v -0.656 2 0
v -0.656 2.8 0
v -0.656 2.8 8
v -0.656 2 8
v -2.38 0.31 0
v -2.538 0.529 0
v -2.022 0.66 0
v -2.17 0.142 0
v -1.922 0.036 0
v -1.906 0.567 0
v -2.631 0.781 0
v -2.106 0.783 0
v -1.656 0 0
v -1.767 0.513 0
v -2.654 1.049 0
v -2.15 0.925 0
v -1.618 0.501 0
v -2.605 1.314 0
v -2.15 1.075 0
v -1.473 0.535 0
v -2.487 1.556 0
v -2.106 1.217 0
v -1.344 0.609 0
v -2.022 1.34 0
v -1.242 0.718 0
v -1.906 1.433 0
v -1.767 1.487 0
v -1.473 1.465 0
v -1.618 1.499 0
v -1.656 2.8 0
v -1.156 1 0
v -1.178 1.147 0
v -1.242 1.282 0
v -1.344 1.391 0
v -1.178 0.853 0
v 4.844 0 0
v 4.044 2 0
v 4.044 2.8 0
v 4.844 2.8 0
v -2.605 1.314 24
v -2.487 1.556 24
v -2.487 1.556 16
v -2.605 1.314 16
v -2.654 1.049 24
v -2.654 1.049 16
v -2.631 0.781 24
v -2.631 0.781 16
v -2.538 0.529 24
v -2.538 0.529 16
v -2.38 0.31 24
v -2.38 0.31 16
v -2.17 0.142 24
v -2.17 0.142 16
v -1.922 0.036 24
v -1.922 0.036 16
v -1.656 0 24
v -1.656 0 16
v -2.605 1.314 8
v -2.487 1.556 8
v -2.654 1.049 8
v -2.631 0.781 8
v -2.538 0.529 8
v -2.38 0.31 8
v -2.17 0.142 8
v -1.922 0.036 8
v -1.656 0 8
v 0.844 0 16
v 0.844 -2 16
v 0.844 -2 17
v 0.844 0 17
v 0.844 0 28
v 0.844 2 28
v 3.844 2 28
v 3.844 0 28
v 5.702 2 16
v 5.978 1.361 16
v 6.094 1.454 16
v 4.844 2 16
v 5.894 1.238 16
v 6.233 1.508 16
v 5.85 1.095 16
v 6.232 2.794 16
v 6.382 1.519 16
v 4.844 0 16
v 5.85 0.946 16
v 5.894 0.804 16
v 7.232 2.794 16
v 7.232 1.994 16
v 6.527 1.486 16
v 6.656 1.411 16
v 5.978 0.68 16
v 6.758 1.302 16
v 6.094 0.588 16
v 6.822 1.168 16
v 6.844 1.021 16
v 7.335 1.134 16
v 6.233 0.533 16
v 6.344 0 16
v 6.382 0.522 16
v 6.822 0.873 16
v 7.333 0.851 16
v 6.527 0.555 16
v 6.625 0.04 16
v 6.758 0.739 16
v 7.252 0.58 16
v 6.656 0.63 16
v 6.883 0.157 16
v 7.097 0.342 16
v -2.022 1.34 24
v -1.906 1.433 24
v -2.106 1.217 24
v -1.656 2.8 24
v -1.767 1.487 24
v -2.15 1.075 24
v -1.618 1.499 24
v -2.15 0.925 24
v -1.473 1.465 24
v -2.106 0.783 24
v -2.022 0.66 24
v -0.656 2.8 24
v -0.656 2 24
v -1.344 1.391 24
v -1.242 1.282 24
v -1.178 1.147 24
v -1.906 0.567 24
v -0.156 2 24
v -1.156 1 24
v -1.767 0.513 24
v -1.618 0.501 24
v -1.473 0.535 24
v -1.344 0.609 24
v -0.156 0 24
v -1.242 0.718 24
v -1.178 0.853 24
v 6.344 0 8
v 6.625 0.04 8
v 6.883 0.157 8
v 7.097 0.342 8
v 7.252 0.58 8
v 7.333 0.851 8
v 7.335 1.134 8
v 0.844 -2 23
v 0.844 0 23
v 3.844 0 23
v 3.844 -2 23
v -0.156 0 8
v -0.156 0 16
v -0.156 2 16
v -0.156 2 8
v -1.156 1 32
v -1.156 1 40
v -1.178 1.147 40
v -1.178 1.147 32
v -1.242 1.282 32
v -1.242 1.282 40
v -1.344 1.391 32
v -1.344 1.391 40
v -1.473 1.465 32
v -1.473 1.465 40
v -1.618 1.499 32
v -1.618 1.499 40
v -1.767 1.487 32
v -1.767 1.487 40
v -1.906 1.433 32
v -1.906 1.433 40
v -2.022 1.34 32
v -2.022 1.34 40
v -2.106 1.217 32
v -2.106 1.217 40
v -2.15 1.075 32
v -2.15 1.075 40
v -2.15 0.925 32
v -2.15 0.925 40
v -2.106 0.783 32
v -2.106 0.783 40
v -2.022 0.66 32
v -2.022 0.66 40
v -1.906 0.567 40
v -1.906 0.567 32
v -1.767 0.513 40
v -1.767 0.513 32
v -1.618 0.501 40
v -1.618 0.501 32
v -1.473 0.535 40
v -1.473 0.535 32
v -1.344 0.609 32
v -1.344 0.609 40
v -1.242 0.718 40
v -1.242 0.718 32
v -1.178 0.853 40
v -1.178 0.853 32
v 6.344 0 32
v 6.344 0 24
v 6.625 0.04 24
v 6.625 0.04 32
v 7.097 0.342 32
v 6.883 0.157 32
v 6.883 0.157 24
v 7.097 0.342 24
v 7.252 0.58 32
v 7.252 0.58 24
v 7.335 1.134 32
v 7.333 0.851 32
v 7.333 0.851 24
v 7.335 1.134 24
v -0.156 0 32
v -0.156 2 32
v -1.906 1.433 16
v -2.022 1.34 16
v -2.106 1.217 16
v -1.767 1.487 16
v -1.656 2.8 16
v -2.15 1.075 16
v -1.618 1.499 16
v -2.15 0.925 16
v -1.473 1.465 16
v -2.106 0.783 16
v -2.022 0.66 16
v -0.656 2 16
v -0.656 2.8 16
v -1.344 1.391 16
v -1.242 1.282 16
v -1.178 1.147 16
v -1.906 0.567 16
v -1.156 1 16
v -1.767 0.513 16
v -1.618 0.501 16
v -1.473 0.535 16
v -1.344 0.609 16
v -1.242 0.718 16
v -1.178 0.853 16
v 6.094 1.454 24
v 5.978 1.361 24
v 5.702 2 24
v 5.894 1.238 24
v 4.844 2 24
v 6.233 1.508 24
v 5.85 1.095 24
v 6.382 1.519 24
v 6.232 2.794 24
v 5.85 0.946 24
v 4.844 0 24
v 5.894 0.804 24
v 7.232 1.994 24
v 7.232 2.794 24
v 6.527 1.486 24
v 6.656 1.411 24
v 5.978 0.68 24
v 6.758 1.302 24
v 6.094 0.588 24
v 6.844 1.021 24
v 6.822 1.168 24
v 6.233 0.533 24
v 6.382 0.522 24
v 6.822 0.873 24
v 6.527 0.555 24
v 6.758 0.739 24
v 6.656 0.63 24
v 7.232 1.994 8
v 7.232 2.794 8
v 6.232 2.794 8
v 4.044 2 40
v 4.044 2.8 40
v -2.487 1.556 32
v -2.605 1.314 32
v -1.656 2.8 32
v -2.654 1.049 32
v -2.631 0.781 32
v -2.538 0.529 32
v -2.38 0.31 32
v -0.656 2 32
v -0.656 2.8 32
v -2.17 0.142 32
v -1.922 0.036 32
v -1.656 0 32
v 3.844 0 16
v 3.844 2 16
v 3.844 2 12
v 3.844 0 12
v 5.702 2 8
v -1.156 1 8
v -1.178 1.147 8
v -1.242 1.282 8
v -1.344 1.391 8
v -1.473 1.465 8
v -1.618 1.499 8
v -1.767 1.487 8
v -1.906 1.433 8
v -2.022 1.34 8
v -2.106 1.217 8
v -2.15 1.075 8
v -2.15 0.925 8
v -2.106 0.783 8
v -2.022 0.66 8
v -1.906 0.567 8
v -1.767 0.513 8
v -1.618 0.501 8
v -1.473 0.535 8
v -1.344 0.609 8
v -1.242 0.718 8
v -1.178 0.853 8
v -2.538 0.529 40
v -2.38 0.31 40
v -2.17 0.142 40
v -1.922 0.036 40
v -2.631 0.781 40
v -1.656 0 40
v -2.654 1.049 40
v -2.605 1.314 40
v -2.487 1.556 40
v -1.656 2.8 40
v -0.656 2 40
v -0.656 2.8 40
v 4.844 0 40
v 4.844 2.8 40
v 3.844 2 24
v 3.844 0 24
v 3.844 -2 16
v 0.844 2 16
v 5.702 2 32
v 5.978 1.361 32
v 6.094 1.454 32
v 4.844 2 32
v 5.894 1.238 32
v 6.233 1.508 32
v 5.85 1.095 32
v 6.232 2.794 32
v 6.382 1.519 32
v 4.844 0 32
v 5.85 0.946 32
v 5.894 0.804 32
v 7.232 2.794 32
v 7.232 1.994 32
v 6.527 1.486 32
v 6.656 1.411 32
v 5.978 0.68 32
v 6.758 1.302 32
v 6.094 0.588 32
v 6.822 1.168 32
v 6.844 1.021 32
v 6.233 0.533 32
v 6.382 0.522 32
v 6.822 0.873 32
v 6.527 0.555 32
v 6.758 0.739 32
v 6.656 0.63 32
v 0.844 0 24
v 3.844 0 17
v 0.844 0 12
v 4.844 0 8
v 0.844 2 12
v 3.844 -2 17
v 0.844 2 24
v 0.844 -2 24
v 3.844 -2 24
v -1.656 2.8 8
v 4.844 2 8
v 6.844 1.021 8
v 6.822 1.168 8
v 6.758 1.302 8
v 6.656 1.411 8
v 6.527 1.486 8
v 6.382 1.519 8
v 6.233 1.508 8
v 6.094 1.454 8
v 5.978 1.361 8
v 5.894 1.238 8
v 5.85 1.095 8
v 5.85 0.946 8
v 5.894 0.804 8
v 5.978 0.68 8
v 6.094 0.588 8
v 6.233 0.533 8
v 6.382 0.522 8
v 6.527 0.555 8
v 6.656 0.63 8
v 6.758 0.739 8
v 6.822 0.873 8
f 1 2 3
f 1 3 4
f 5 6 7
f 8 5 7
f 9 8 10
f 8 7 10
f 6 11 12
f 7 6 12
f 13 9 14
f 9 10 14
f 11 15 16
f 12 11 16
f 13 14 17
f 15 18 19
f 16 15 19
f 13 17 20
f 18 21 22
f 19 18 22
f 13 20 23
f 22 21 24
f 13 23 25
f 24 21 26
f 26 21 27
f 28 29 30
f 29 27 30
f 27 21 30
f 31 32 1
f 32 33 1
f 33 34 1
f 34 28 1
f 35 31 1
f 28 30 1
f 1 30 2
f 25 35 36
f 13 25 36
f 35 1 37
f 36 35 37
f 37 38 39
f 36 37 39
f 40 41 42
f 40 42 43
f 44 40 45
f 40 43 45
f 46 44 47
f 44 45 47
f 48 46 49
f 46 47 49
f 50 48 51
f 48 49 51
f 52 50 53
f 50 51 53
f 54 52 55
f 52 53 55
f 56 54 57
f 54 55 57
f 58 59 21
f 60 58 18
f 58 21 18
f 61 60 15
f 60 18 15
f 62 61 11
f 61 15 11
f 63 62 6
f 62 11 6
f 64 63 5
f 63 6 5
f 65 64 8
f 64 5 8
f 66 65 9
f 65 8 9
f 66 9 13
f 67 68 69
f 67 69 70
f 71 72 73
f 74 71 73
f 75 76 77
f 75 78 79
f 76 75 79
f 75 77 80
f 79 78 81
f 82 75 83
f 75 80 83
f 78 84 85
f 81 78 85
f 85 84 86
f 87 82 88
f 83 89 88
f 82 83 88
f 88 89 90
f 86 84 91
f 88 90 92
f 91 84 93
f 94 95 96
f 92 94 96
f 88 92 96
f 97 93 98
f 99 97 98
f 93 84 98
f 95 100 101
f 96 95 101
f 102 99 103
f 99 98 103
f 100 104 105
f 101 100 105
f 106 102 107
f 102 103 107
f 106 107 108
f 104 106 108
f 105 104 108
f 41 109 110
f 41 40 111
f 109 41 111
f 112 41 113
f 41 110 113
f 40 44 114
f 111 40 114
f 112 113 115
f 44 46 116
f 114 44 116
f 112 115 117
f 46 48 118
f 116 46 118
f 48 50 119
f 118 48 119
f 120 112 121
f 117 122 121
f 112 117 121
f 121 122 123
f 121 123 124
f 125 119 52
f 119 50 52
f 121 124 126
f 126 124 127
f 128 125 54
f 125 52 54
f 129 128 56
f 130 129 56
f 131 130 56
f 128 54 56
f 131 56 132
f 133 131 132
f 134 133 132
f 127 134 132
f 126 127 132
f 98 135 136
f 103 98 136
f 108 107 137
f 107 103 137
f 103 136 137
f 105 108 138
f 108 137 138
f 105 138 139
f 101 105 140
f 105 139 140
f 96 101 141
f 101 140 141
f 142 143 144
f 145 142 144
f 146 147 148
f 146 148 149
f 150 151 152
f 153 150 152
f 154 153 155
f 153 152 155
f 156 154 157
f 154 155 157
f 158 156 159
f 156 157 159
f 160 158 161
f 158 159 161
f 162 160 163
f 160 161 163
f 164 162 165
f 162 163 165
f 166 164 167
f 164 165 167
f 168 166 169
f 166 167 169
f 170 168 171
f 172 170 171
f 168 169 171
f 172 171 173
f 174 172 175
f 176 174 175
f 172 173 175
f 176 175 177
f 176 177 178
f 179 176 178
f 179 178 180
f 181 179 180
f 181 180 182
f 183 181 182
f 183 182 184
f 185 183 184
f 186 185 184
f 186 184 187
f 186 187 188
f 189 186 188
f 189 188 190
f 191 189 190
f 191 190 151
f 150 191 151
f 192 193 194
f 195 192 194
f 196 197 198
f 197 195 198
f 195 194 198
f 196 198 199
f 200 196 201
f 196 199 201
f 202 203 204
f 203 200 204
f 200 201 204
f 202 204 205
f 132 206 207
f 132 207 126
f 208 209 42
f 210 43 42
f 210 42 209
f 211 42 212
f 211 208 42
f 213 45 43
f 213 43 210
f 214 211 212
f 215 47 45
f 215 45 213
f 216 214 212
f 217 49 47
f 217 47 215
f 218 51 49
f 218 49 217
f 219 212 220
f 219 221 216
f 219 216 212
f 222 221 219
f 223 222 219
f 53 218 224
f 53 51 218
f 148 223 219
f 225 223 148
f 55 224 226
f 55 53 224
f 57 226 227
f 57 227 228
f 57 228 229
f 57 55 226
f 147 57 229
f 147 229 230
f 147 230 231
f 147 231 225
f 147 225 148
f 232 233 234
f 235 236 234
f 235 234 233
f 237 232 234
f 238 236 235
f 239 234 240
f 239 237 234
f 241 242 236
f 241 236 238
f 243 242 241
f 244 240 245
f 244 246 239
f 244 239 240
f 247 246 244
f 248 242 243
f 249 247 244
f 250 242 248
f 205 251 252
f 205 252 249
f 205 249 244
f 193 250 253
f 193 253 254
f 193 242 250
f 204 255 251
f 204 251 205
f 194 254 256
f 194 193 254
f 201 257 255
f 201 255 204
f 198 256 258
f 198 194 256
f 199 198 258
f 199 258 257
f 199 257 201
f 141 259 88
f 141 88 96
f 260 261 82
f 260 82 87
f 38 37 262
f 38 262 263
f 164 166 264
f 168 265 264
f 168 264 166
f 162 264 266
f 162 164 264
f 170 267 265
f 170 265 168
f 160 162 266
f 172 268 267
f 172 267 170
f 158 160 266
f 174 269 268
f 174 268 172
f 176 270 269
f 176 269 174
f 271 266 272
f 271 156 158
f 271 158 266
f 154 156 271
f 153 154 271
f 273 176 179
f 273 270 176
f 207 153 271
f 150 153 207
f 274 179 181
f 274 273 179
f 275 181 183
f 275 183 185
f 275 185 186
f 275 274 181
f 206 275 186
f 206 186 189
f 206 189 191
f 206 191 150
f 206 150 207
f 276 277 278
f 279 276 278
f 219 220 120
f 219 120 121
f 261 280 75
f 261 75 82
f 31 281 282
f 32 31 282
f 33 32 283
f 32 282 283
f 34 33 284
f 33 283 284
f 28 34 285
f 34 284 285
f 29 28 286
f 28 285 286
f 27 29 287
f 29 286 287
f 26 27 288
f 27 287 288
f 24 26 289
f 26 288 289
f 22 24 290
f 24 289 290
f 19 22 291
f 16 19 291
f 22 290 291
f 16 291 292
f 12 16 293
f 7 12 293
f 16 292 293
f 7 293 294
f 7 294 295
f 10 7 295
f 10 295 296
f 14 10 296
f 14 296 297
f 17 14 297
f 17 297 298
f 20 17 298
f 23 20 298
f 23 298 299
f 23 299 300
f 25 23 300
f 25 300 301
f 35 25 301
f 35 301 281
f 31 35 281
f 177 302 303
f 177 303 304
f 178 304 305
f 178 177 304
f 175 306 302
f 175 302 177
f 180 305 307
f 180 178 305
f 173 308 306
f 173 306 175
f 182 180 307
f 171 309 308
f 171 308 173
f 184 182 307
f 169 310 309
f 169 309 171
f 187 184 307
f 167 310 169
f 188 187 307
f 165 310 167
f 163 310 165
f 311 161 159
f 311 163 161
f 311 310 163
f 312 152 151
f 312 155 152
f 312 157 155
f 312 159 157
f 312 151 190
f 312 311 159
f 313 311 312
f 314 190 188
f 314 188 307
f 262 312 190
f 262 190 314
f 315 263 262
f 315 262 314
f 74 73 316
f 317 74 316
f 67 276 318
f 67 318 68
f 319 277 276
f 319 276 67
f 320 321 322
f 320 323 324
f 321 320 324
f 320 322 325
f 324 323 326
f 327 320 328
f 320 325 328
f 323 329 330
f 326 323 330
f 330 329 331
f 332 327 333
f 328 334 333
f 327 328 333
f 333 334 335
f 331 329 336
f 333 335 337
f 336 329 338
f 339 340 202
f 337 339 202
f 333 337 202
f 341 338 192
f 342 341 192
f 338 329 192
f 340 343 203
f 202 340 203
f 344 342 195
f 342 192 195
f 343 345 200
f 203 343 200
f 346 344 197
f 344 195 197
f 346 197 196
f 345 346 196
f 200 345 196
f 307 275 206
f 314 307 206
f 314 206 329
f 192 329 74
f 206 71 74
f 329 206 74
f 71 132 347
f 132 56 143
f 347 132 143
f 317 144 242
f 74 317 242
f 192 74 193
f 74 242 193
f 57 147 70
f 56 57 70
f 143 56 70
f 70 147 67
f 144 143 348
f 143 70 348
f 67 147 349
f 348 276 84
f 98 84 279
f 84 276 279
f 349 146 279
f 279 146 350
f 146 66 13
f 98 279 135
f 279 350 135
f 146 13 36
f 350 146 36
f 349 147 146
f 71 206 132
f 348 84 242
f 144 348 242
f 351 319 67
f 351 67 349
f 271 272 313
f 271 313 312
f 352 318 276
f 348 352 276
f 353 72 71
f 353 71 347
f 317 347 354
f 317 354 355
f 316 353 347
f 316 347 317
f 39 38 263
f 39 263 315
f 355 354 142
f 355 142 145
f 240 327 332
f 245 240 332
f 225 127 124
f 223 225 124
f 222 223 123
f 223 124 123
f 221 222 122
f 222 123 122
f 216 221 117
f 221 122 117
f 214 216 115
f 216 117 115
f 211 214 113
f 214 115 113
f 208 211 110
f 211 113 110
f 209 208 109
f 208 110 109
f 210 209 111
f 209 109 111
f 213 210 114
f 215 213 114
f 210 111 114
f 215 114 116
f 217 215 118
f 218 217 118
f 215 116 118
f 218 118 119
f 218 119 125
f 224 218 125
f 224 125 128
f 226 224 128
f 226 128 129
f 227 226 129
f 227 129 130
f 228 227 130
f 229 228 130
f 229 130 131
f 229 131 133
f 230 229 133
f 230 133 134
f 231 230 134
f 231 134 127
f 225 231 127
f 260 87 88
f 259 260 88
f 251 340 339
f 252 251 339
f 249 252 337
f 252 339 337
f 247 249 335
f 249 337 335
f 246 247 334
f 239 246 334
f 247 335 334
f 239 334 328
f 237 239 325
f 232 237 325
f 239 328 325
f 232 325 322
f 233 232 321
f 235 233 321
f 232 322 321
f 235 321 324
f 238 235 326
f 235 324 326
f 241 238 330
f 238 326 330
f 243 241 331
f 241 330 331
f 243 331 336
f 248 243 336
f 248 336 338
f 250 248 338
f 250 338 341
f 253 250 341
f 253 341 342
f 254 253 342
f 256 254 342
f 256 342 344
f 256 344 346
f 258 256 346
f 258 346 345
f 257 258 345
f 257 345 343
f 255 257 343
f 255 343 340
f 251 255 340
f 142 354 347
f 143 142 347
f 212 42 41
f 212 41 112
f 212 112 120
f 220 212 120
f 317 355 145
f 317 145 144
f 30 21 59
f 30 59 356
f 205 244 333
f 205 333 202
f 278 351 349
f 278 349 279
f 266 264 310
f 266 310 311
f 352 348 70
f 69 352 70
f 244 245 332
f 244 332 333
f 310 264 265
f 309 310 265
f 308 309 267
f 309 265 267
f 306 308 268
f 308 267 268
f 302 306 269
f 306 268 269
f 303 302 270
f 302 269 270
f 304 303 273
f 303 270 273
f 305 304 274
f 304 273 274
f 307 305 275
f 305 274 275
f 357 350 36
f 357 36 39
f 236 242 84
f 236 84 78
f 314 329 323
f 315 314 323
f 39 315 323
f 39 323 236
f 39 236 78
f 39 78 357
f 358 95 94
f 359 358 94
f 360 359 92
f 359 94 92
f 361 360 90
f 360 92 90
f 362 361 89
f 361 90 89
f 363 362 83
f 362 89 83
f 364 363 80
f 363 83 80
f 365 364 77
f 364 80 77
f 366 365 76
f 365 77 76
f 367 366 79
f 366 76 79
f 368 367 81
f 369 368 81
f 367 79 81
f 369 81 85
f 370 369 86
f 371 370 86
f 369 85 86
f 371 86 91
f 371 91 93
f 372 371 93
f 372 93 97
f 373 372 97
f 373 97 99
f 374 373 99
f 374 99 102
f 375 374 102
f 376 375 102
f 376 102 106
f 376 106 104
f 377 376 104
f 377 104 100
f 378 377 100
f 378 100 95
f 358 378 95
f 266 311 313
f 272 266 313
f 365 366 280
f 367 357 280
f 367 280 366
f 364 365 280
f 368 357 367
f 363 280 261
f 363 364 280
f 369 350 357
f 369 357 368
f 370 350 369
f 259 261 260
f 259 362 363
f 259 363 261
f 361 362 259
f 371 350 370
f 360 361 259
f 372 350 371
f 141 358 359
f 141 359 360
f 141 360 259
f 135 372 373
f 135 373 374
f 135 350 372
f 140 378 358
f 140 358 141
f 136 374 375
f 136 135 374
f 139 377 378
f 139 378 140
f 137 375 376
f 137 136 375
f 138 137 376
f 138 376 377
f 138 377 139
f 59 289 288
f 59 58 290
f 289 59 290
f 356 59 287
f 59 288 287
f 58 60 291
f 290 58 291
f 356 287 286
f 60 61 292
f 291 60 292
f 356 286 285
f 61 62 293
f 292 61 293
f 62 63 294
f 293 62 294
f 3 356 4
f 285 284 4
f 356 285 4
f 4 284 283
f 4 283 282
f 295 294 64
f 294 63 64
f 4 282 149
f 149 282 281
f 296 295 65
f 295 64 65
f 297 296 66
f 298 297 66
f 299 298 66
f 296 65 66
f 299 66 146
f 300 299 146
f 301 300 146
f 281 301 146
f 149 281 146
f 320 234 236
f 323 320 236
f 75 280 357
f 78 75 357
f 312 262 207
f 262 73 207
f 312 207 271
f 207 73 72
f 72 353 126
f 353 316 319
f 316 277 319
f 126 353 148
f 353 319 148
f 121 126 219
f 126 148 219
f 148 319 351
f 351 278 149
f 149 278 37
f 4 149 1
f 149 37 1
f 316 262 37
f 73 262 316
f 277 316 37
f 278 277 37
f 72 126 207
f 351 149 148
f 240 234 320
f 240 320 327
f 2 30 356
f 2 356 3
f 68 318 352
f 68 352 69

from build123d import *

# Parameters (mm, degrees)
EXTRUDE_1_DEPTH     = 40
SKETCH_3_R          = 0.5
CUT_EXTRUDE_1_DEPTH = 40
EXTRUDE_START       = -40
EXTRUDE_5_DEPTH     = 40
EXTRUDE_6_DEPTH     = 40
SKETCH_14_W         = 2.5
SKETCH_14_H         = 8
CUT_EXTRUDE_8_DEPTH = 40
SKETCH_15_W         = 3
SKETCH_15_H         = 4
CUT_EXTRUDE_9_DEPTH = 41.71781145
SKETCH_16_W         = 0.8
SKETCH_16_H         = 0.8
EXTRUDE_7_DEPTH     = 40
SKETCH_17_W         = 3
SKETCH_17_H         = 2
EXTRUDE_8_DEPTH     = 1
SKETCH_18_W         = 3
SKETCH_18_H         = 2
EXTRUDE_9_DEPTH     = 1


with BuildPart() as part:
    # 草图2 → 凸台-拉伸1 (new body)
    with BuildSketch(Plane.XY):
        with BuildLine():
            Line((-1.655607757, 0), (6.344392243, 0))
            ThreePointArc((6.344392243, 0), (7.344397132, 0.999995111), (6.344402021, 2))
            Line((6.344402021, 2), (-1.655607757, 2))
            ThreePointArc((-1.655607757, 2), (-2.655607757, 1), (-1.655607757, 0))
        make_face()
    extrude(amount=EXTRUDE_1_DEPTH)

    # 草图3 → 切除-拉伸1 (cut)
    with BuildSketch(Plane.XY.offset(40)):
        with Locations((-1.655607757, 1)):
            Circle(SKETCH_3_R)
        with Locations((6.344392243, 1.020580345)):
            Circle(SKETCH_3_R)
    extrude(amount=-CUT_EXTRUDE_1_DEPTH, mode=Mode.SUBTRACT)

    # 草图11 → 凸台-拉伸5 (add)
    with BuildSketch(Plane.XY.offset(40).offset(EXTRUDE_START)):
        with BuildLine():
            Line((-1.655607757, 2.8), (-0.655607757, 2.8))
            Line((-0.655607757, 2.8), (-0.655607757, 2))
            Line((-0.655607757, 2), (-1.655607757, 2))
            ThreePointArc((-1.655607757, 2), (-2.127012277, 1.881917104), (-2.487087176, 1.555555556))
            Line((-2.487087176, 1.555555556), (-1.655607757, 2.8))
        make_face()
    extrude(amount=EXTRUDE_5_DEPTH)

    # 草图12 → 凸台-拉伸6 (add)
    with BuildSketch(Plane.XY.offset(40).offset(EXTRUDE_START)):
        with BuildLine():
            Line((6.231808662, 1.993641704), (5.701534493, 2))
            Line((5.701534493, 2), (6.231808662, 2.793641704))
            Line((6.231808662, 2.793641704), (7.231808662, 2.793641704))
            Line((7.231808662, 2.793641704), (7.231808662, 1.993641704))
            Line((7.231808662, 1.993641704), (7.335350835, 1.134204168))
            ThreePointArc((7.335350835, 1.134204168), (7.043760809, 1.71476601), (6.456985603, 1.993641704))
            Line((6.456985603, 1.993641704), (6.231808662, 1.993641704))
        make_face()
    extrude(amount=EXTRUDE_6_DEPTH)

    # 草图14 → 切除-拉伸8 (cut)
    with BuildSketch(Plane(origin=(0, 0, 0), x_dir=(1, 0, 0), z_dir=(0, 1, 0))):
        with Locations((-1.405607757, -12)):
            Rectangle(SKETCH_14_W, SKETCH_14_H)
        with Locations((-1.405607757, -28)):
            Rectangle(SKETCH_14_W, SKETCH_14_H)
        with Locations((6.094397132, -4)):
            Rectangle(SKETCH_14_W, SKETCH_14_H)
        with Locations((6.094397132, -20)):
            Rectangle(SKETCH_14_W, SKETCH_14_H)
        with Locations((6.094397132, -36)):
            Rectangle(SKETCH_14_W, SKETCH_14_H)
    extrude(amount=CUT_EXTRUDE_8_DEPTH, mode=Mode.SUBTRACT)

    # 草图15 → 切除-拉伸9 (cut, through all)
    with BuildSketch(Plane(origin=(0, 2, 0), x_dir=(1, 0, 0), z_dir=(0, 1, 0))):
        with Locations((2.344392243, -14)):
            Rectangle(SKETCH_15_W, SKETCH_15_H)
        with Locations((2.344392243, -26)):
            Rectangle(SKETCH_15_W, SKETCH_15_H)
    extrude(amount=-CUT_EXTRUDE_9_DEPTH, mode=Mode.SUBTRACT)

    # 草图16 → 凸台-拉伸7 (add)
    with BuildSketch(Plane.XY.offset(40)):
        with Locations((4.444397132, 2.4)):
            Rectangle(SKETCH_16_W, SKETCH_16_H)
    extrude(amount=-EXTRUDE_7_DEPTH)

    # 草图17 → 凸台-拉伸8 (add)
    with BuildSketch(Plane.XY.offset(24)):
        with Locations((2.344392243, -1)):
            Rectangle(SKETCH_17_W, SKETCH_17_H)
    extrude(amount=-EXTRUDE_8_DEPTH)

    # 草图18 → 凸台-拉伸9 (add)
    with BuildSketch(Plane(origin=(0, 0, 16), x_dir=(-1, 0, 0), z_dir=(0, 0, -1))):
        with Locations((-2.344392243, -1)):
            Rectangle(SKETCH_18_W, SKETCH_18_H)
    extrude(amount=-EXTRUDE_9_DEPTH)


solid = part.part
